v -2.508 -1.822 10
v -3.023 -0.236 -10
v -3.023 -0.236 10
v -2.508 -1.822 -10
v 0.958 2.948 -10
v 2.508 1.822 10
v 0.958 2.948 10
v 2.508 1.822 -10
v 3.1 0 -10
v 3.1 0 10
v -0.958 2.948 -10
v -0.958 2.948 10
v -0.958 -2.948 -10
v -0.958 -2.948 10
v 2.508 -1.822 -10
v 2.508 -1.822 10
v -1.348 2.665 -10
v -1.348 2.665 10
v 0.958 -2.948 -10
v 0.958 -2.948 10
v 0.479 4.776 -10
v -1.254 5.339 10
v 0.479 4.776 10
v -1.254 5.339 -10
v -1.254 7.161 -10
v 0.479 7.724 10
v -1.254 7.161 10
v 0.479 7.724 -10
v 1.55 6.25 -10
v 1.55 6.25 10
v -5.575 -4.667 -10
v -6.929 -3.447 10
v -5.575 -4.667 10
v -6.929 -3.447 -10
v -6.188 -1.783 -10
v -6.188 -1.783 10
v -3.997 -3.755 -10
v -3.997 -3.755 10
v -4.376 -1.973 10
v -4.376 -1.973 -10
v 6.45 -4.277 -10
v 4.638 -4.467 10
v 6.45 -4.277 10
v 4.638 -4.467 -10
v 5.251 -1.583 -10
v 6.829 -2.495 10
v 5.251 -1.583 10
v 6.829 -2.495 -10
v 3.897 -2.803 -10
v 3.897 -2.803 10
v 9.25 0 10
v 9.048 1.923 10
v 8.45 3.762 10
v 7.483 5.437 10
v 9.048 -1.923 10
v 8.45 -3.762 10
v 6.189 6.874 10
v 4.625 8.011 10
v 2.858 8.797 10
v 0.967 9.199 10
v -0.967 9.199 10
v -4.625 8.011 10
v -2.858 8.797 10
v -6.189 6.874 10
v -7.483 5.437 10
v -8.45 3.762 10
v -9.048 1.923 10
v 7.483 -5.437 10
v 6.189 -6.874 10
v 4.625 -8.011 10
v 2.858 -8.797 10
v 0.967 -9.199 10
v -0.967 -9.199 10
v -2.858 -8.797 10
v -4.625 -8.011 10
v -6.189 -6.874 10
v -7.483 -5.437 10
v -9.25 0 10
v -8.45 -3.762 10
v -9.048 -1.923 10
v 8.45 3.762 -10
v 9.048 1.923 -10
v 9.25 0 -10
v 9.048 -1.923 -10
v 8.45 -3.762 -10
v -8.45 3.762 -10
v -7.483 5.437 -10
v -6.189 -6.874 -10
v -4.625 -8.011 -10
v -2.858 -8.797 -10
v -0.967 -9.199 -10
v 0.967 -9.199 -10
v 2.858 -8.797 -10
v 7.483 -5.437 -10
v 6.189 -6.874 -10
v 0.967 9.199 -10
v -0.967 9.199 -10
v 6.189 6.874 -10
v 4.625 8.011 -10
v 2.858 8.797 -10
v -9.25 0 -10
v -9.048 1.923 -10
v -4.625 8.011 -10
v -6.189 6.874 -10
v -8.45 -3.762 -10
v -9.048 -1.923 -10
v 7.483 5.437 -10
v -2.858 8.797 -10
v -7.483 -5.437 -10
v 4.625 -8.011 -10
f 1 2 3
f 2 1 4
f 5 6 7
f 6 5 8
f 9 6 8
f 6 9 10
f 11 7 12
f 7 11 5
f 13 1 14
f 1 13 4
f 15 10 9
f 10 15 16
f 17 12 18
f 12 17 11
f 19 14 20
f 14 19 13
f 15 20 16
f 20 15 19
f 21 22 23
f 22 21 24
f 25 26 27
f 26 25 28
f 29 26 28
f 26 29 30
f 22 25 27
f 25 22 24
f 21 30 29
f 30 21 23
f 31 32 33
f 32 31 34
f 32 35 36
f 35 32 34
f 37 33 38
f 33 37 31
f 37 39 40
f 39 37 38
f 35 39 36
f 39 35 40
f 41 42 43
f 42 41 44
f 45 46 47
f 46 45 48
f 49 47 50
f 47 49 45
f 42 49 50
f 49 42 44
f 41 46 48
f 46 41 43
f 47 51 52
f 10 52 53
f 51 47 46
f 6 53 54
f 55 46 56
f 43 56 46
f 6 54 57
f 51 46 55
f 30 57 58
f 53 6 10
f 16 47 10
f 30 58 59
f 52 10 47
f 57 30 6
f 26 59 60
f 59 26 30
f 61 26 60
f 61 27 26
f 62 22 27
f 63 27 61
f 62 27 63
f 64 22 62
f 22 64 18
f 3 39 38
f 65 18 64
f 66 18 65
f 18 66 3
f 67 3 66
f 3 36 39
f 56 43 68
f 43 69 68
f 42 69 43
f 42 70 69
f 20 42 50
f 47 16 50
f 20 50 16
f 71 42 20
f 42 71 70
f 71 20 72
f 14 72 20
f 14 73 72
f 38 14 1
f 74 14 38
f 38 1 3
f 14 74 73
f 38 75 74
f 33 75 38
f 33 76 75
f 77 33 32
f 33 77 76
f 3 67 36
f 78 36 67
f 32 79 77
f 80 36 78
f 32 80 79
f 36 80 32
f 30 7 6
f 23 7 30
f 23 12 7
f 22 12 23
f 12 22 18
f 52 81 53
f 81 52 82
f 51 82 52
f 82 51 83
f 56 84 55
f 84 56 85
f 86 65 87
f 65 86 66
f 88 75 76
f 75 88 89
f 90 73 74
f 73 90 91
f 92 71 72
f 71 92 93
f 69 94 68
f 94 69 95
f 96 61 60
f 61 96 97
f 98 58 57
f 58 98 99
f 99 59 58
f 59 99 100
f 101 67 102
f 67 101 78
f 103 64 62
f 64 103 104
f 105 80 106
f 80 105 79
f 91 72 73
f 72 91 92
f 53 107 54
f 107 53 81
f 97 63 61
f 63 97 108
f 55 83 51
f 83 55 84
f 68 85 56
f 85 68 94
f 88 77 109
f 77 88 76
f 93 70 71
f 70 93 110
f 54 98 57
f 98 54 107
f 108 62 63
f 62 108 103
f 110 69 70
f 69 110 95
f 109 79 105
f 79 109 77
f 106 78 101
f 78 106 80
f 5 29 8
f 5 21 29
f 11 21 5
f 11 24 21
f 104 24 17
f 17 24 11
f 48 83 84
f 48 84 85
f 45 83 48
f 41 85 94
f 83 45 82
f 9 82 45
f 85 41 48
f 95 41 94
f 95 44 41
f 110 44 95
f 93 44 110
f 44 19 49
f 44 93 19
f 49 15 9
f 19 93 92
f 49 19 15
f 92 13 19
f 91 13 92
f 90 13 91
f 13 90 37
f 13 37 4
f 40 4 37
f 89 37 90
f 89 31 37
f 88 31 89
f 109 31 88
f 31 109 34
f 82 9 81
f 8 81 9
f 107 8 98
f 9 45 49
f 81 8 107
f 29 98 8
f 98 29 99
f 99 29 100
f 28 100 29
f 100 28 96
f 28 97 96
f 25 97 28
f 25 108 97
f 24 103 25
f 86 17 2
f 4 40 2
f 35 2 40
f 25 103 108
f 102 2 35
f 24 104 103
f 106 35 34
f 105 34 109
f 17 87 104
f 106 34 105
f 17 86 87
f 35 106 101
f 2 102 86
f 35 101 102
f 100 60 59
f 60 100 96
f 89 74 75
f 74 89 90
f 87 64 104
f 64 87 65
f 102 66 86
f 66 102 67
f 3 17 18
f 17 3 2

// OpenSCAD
// file: parameters/commonParameters.scad
// All measurements in millimeters

// "horizontal" and "vertical" refer to how they are printed on the print bed,
// not how they work on the final assembly.
// ALWAYS print verticle pipes straight up if possible, that is 90 degrees from the bed.
// Attempting to print a slanted pipe will be troublesome and require testing for a proper size.
// However, you can print ANY angle ON the bed.

// 1.25" PVC Pipe:
horizontalPipeInsideDiameter_1_25pvc = 42.9;
verticalPipeInsideDiameter_1_25pvc = 42.5;

// 0.5" PVC Pipe:
horizontalPipeInsideDiameter_0_50pvc = 22.1;
verticalPipeInsideDiameter_0_50pvc = 21.7;

// Parameters
jointLegLength = 50;
jointWallThickness = 3.5;
jointPinningHoleDiameter = 7;
jointPinHoleOffset = 10;

// Walker Foot Parameters
inchesToMmConversionFactor = 25.4;

// Current idea is 11 x 21 inches.
walkerFootHeight = 11 * inchesToMmConversionFactor;
walkerFootLength = 21 * inchesToMmConversionFactor;
// Back of Foot is 4 inches longer to cause foot to hang AND LOOK as desired
// I tried 1 inch and it had basically NO affect on how it hangs.
// I think it looks cool at 4 inches, so I am going to test that.
// I *THINK* that it actually doesn't affect lenght of the walker, because the front
// of one compensates for the back of the other.
walkerFootCenterOffset = 0 * inchesToMmConversionFactor; // Remember to multiply any offset by the conversion factor.
walkerFootFrontLength = (walkerFootLength / 2) - (walkerFootCenterOffset / 2);
walkerFootBackLength = (walkerFootLength / 2) + (walkerFootCenterOffset / 2);

footLowerJointLegLength = 75;

// Angles
// This site is great for visualizing what you want: https://www.blocklayer.com/trig/scaleneeng.aspx
// Use this site to check your math and results: https://www.calculator.net/right-triangle-calculator.html
//echo("=======================================================");
//echo("Walker Foot Parameters");
//echo("walkerFootLength", walkerFootLength, walkerFootFrontLength + walkerFootBackLength);
//echo("=======================================================");
//echo("Front:");
//echo("walkerFootHeight (a)", walkerFootHeight);
//echo("walkerFootFrontLength (b)", walkerFootFrontLength);
//walkerFootFrontTriangleTopLength = sqrt(pow(walkerFootHeight, 2) + pow(walkerFootFrontLength, 2));
//echo("walkerFootFrontTriangleTopLength (c)", walkerFootFrontTriangleTopLength);
//walkerFootFrontJointAngle = asin(walkerFootHeight / walkerFootFrontTriangleTopLength);
//echo("walkerFootFrontJointAngle (α):", walkerFootFrontJointAngle);
//walkerAnkleFrontAngle = asin(walkerFootFrontLength / walkerFootFrontTriangleTopLength);
//echo("walkerAnkleFrontAngle (β)", walkerAnkleFrontAngle);
//echo("-------------------------------------------------------");
//echo("Back");
//echo("walkerFootBackLength (b)", walkerFootBackLength);
//walkerFootBackTriangleTopLength = sqrt(pow(walkerFootHeight, 2) + pow(walkerFootBackLength, 2));
//echo("walkerFootBackTriangleTopLength (c)", walkerFootBackTriangleTopLength);
//walkerFootBackJointAngle = asin(walkerFootHeight / walkerFootBackTriangleTopLength);
//echo("walkerFootBackJointAngle (α):", walkerFootBackJointAngle);
//walkerAnkleBackAngle = asin(walkerFootBackLength / walkerFootBackTriangleTopLength);
//echo("walkerAnkleBackAngle (β)", walkerAnkleBackAngle);
//echo("=======================================================");



// This height is purely based on giving space for nice triangles supports.
// It could be shorter, just be sure to adjust the triangles.
walkerBodyLowerShaftHolderRollerBearingHeightAboveThrustBearing = 50;

// 12v Battery Box
batteryHolderWallThickness = 5;

// Battery Dimensions
// https://www.power-sonic.com/product/ps-1290/
batteryHeight = 94;
batteryWidth = 65.6; // Ben uses 65.6, Web Site says 65
batteryLength = 150.6; // Ben uses 150.6, Web site says 141
batteryBoxDepth = 60; // This is arbitrary. Ben uses 60 for the Dalek

// Colors
JointColor = "CornflowerBlue";
PipeColor = "Pink";

// Resoution
// This is perfect for 3D Printing,
// but you may want to comment it out while working to improve preview
// performance
//$fa = 1;
//$fs = 0.4;
// Although this makes it VERY high rez, which might be better for the slicer? Experimenting with it instead.
// NOTE that using $fn causes FreeCAD and hence .step files exported to Fusion 360 to show round items as a series of faces instead of a single object.
//$fn = 500;
// main file
// Print at 100% infill

// Load in some defaults
include <parameters/commonParameters.scad>;

shaftDiameter = 6.2;
hubLength = 20;
hubDiameter = 18.5;
screwHoleDiameter = 3.1; // Perfect
screwHolePosition = (hubDiameter / 2) - 3;

difference() {
    cylinder(d = hubDiameter, h = hubLength, center = true);
    union() {
        cylinder(d = shaftDiameter, h = hubLength + 0.2, center = true);
        translate([0, screwHolePosition, 0])
            cylinder(d = screwHoleDiameter, h = hubLength + 0.2, center = true);
        rotate([0, 0, 120])
            translate([0, screwHolePosition, 0])
                cylinder(d = screwHoleDiameter, h = hubLength + 0.2, center = true);
        rotate([0, 0, 120 * 2])
            translate([0, screwHolePosition, 0])
                cylinder(d = screwHoleDiameter, h = hubLength + 0.2, center = true);
    }
}

rotate([0, 0, 120 / 2])
    translate([0, 3.5, 0])
        cube([6, 2, hubLength], center = true);
